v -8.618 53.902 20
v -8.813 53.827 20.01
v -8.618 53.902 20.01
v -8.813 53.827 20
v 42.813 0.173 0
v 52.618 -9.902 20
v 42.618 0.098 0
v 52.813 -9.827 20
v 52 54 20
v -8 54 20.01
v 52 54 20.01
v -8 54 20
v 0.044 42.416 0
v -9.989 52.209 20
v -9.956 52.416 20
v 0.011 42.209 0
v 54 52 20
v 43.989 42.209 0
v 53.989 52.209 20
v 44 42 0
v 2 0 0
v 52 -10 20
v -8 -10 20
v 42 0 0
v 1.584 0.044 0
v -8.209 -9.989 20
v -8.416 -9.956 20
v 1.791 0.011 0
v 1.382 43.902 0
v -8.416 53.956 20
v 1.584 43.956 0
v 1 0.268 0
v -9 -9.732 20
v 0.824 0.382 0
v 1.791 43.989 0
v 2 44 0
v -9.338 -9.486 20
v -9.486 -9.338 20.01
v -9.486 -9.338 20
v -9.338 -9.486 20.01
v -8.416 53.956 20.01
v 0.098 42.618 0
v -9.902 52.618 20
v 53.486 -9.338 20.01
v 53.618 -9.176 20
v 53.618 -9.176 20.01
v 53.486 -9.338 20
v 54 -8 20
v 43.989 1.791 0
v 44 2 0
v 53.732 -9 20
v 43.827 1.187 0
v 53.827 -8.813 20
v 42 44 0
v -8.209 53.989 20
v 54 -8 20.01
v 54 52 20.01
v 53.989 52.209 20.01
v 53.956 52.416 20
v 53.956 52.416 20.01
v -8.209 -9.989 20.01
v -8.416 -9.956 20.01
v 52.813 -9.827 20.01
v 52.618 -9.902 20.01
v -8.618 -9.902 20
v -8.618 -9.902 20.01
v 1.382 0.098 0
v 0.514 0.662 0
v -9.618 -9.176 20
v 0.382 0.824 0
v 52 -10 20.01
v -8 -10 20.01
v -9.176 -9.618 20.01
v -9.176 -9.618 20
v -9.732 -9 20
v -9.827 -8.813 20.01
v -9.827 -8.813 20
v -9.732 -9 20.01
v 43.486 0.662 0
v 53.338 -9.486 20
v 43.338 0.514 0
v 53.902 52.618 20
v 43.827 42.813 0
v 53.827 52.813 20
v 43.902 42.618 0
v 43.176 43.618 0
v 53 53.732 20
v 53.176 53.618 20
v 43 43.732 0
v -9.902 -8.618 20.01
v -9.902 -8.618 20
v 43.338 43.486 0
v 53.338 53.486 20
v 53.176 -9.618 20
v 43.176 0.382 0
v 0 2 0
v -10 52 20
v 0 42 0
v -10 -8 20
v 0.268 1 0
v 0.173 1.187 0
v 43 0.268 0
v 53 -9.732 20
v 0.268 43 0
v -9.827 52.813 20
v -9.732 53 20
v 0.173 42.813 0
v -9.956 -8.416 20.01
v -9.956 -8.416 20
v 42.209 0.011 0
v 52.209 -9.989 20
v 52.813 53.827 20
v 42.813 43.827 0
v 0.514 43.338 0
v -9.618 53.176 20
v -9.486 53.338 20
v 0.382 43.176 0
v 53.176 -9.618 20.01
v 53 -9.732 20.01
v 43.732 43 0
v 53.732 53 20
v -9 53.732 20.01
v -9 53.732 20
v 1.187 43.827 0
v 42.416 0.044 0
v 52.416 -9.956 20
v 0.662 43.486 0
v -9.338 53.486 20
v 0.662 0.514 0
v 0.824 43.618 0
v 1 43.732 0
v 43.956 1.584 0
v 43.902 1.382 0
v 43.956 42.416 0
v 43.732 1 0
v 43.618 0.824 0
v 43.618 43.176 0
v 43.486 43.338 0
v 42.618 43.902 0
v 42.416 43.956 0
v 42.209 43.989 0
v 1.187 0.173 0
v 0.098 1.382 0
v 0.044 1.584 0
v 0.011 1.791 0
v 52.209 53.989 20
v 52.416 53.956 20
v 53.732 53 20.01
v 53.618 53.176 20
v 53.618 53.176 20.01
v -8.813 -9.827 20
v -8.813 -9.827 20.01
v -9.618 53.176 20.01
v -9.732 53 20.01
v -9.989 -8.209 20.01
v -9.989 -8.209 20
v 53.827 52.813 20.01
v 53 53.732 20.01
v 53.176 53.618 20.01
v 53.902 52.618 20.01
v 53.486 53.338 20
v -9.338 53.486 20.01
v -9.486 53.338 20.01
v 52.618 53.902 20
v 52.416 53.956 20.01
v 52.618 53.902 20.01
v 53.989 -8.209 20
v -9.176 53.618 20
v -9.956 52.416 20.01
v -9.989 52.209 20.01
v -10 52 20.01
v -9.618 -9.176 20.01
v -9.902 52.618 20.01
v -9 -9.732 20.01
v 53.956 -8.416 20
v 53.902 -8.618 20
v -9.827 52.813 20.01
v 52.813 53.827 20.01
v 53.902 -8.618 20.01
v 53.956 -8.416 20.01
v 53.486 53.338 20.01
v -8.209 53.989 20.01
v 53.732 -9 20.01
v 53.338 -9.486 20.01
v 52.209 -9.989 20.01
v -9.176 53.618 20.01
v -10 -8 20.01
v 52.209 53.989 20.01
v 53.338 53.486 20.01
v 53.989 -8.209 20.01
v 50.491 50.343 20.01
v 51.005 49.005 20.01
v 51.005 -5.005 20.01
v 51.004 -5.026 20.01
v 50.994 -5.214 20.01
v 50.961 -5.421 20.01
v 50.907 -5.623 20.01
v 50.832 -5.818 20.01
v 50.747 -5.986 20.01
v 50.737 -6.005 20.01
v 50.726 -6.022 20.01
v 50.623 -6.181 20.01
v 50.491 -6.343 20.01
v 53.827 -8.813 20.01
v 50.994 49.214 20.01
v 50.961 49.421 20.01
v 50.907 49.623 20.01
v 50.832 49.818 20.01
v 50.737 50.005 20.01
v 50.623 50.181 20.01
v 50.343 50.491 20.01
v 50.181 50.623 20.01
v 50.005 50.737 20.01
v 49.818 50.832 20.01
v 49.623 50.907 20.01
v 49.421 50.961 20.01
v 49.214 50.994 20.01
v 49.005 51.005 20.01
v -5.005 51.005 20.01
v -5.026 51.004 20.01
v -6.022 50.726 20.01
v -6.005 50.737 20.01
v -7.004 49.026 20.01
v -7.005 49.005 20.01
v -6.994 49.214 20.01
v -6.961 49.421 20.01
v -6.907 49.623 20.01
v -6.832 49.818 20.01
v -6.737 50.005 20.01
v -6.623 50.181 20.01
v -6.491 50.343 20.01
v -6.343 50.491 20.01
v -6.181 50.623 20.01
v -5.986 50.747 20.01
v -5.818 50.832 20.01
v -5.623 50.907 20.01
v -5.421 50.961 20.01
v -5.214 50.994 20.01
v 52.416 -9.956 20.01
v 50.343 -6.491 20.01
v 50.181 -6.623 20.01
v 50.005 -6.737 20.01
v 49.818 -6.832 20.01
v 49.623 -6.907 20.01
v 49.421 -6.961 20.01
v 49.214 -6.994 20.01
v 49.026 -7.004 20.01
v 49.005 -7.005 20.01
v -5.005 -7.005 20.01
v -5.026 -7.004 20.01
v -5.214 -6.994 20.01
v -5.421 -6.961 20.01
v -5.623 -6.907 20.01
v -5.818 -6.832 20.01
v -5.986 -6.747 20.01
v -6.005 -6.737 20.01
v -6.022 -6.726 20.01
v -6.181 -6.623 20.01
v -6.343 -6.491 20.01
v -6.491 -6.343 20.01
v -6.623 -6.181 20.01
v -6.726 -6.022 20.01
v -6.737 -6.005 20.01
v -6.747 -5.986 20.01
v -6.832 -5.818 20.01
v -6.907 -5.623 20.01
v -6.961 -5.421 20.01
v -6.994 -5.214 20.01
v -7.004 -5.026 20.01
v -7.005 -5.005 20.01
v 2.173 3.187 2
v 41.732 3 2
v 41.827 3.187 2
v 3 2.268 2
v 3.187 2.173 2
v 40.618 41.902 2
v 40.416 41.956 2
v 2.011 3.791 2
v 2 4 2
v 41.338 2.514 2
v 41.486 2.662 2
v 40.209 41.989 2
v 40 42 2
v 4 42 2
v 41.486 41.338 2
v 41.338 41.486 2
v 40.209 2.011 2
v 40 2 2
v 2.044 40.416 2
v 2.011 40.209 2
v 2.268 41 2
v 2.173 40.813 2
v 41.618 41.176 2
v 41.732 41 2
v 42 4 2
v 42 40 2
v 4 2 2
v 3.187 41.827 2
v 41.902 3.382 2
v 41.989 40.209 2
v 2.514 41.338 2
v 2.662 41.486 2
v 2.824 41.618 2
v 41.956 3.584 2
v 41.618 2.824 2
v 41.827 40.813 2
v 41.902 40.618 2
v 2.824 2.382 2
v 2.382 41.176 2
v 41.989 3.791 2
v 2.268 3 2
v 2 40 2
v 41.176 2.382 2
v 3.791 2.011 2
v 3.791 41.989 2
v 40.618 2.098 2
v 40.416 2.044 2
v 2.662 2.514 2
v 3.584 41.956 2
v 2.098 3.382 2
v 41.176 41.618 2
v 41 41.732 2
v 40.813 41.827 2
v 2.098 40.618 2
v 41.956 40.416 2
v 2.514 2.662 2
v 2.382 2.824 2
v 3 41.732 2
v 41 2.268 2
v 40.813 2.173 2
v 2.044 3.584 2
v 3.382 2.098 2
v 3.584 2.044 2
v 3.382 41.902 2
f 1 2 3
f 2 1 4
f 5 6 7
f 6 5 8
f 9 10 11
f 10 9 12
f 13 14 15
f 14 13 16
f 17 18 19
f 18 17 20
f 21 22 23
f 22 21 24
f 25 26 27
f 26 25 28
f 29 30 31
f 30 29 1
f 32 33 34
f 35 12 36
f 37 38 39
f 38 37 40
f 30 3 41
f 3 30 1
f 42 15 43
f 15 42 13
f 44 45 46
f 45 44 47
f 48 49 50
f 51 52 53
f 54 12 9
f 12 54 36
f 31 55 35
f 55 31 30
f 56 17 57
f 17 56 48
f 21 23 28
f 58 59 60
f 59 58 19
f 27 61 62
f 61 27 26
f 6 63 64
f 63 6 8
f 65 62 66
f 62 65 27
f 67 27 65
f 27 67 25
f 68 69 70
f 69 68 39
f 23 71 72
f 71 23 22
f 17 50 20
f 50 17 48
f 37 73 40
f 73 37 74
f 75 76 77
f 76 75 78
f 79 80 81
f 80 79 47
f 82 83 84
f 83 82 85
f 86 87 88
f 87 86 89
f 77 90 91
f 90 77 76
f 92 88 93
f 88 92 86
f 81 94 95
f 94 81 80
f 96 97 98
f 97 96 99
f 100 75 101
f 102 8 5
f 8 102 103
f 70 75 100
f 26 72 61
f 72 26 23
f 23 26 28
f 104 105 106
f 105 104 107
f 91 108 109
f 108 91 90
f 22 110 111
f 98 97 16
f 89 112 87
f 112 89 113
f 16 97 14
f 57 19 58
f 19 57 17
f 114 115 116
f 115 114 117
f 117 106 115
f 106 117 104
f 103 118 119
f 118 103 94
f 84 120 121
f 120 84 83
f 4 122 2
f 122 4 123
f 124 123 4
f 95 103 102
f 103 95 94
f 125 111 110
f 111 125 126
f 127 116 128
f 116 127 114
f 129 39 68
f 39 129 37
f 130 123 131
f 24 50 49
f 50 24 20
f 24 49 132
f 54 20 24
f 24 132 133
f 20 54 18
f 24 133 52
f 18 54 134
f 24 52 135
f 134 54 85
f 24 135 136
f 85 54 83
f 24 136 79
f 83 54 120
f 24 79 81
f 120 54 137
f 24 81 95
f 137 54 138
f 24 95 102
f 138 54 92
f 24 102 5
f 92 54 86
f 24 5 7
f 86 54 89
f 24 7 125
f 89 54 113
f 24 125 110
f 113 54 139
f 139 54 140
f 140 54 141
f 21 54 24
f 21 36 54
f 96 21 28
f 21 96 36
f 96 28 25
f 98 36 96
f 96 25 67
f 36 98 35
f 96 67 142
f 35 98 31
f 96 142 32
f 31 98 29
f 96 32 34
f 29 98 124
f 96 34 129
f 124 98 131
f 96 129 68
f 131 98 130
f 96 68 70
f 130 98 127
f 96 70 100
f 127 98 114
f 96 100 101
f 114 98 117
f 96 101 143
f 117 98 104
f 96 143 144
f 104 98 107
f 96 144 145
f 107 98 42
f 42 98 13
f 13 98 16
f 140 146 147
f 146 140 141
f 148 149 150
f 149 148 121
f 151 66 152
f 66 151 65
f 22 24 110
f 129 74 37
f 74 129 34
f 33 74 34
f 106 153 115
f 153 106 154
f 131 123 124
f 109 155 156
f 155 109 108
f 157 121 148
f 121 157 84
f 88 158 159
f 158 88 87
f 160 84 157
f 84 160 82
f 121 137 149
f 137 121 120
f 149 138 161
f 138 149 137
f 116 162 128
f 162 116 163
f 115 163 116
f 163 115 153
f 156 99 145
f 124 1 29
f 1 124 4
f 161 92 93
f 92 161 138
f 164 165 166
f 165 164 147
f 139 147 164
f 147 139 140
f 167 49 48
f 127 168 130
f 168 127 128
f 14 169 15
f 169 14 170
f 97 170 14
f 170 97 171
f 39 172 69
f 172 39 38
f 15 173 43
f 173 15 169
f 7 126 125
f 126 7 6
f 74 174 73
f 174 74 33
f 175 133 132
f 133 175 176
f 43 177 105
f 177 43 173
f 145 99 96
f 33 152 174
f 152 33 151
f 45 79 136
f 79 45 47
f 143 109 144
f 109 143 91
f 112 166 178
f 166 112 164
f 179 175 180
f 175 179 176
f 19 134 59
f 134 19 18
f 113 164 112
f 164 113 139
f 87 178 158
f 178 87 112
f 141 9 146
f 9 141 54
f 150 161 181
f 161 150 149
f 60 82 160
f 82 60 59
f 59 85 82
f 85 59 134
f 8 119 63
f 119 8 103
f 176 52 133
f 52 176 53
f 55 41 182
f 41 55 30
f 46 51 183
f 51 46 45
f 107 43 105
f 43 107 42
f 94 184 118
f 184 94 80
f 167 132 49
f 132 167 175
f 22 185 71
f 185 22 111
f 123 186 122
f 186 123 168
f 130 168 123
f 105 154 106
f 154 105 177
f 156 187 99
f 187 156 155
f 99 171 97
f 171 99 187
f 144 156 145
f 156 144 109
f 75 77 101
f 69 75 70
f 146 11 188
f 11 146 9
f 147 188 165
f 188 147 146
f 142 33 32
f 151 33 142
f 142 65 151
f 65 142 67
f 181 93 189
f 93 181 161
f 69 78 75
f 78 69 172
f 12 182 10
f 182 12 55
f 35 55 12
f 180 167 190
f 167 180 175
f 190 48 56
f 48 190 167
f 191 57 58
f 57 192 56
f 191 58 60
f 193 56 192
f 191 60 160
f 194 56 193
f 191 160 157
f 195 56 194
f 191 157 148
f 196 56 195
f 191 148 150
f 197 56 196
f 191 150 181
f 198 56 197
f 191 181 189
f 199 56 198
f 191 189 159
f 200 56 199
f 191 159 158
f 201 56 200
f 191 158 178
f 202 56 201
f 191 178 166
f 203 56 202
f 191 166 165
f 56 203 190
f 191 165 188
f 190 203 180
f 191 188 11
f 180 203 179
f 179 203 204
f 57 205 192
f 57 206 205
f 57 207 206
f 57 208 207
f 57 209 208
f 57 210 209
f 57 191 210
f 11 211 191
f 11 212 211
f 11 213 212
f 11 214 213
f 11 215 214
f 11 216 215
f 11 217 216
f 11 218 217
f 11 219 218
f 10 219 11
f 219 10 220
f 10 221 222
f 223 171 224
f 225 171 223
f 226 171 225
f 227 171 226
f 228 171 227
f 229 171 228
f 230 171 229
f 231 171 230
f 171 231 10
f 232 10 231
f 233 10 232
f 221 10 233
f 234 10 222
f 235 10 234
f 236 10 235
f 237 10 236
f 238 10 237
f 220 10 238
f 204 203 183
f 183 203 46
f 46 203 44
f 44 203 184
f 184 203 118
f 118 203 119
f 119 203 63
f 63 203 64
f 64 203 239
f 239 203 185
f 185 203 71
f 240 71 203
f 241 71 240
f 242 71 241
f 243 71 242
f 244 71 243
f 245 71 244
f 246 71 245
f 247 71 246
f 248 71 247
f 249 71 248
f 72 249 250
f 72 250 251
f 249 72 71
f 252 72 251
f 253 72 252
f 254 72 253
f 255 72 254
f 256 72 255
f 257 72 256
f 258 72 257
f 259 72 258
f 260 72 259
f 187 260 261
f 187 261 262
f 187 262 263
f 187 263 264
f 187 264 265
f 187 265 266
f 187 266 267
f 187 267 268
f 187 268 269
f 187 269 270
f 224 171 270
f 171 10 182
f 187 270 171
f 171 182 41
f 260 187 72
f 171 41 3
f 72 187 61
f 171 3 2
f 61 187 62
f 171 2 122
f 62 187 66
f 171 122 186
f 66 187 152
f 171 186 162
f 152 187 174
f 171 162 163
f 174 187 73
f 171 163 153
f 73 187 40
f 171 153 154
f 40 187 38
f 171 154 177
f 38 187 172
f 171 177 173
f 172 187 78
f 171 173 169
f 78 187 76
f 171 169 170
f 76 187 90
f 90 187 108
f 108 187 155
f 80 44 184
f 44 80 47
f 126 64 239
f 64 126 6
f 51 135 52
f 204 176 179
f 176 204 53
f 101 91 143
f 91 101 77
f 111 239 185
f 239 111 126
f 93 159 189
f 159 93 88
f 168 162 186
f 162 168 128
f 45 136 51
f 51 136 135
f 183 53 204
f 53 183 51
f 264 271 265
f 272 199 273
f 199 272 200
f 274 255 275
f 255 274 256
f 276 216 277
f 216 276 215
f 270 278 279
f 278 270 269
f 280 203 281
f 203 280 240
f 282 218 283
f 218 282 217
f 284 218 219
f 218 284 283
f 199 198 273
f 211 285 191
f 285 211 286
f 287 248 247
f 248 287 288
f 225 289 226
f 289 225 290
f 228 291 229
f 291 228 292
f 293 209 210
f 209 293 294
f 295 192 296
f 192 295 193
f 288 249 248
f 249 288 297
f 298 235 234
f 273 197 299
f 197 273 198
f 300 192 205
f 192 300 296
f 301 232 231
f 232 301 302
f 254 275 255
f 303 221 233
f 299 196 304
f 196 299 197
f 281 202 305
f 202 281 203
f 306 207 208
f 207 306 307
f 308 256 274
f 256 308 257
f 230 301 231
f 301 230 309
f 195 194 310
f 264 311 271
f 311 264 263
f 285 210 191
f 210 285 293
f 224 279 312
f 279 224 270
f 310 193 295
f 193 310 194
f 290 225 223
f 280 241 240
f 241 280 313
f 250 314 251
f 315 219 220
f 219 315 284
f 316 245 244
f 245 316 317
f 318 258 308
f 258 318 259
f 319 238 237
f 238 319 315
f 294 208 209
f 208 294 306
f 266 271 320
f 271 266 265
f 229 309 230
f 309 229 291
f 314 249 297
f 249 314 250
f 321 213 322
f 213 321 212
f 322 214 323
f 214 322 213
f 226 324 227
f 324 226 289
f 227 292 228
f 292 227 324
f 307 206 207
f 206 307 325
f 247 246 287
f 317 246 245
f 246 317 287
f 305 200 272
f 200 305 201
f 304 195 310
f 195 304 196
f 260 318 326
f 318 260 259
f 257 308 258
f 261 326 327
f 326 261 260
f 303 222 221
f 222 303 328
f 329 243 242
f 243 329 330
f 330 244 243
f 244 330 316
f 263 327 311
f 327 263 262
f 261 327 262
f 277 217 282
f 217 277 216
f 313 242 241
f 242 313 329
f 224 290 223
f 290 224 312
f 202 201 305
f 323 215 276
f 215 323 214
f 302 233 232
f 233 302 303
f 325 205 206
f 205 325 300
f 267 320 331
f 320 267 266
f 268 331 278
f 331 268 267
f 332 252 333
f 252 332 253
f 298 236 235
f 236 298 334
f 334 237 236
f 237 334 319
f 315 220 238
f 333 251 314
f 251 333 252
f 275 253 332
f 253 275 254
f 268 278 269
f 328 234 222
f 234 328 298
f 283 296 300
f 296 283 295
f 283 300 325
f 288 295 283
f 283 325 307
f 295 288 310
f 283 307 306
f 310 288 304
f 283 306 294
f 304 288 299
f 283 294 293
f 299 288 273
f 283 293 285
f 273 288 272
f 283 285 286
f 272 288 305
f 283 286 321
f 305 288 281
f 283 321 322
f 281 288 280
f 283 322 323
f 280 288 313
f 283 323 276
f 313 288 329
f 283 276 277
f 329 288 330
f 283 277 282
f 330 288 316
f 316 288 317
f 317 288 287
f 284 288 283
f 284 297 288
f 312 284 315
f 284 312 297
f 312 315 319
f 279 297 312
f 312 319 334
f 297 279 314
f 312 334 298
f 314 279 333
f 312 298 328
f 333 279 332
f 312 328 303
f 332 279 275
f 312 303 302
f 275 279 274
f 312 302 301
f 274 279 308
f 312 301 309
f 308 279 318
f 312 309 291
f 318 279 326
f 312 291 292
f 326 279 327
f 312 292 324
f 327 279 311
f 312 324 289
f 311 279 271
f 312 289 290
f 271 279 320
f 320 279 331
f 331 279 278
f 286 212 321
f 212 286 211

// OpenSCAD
//dimensionType -- "inner" if the passed in dimensions are for the inside of the box i.e. the hollow parts (default), 
//  "outer" if the passed in dimensions are for the outside of the box. In this case the dimensions of the hollow part
//  will be calculated taking into account the passed in wallThickness
//hasFloor = true to make it a box with a floor, false to make the hole all the way through
module hollowCube(length = 10, width = 10, height = 10, wallThickness = 3, hasFloor = true, dimensionType = "inner", center = false, debug = false) {
    doubleWallThickness = wallThickness * 2;

    if (dimensionType == "inner") {
        echo("InnerDimensioned Hollow Cube");
        innerDimensioned();
    } else {
        echo("OuterDimensioned Hollow Cube");
        outerDimensioned();
    }

    module innerDimensioned() {
        difference() {
            //Exterior
            exteriorLength = length + doubleWallThickness;
            exteriorWidth = width + doubleWallThickness;
            if (debug) {
                echo("Wall Thickess: ", wallThickness);
                echo("Double Wall Thickess: ", doubleWallThickness);
                echo("Inner Length: ", length);
                echo("Inner Width: ", width);
                echo("Exterior Length: ", exteriorLength);
                echo("Exterior Width: ", exteriorWidth);
            }

            cube([exteriorLength, exteriorWidth, height], center = center);

            //Hollow interior
            x = center == true ? 0 : wallThickness;
            y = center == true ? 0 : wallThickness;
            if (hasFloor == true) {
                translate([x, y, wallThickness]) cube([length, width, height], center = center);
            } else {
                translate([x, y, -1]) cube([length, width, height + 10], center = center);
            }
        }
    }

    module outerDimensioned() {
        difference() {
            //Exterior
            innerLength = length - doubleWallThickness;
            innerWidth = width - doubleWallThickness;
            echo("Wall Thickess: ", wallThickness);
            echo("Double Wall Thickess: ", doubleWallThickness);
            echo("Exterior Length: ", length);
            echo("Exterior Width: ", width);
            echo("Inner Length: ", innerLength);
            echo("Inner Width: ", innerWidth);

            cube([length, width, height], center = center);

            //Hollow interior
            x = center ? 0 : wallThickness;
            y = center ? 0 : wallThickness;
            if (hasFloor) {
                translate([x, y, wallThickness]) cube([innerLength, innerWidth, height], center = center);
            } else {
                translate([x, y, -1]) cube([innerLength, innerWidth, height + 10], center = center);
            }
        }
    }
}

//dimensionType -- "inner" if the passed in dimensions are for the inside of the box i.e. the hollow parts (default), 
//  "outer" if the passed in dimensions are for the outside of the box. In this case the dimensions of the hollow part
//  will be calculated taking into account the passed in wallThickness
//hasFloor = true to make it a box with a floor, false to make the hole all the way through
//roundingShape = one of "sphere" or "circle", a sphere rounds the object along all edges, circle rounds just the corners
//  if topRoundingShape is undef this applies to all edges
//topRoundingShape = one of "sphere" or "circle", a sphere rounds the object along all edges, circle rounds just the corners
//  if defined is the rounding shape of the top edges in case you want top edges rounded differently (can be handy for lids)
module hollowRoundedCube(length = 10, width = 10, height = 10, radius = 1, wallThickness = 3, floorThickness = 3, hasFloor = true, 
    roundingShape = "sphere", topRoundingShape = undef, dimensionType = "inner", roundedInterior = false, center = false) {

    topRoundingShape = topRoundingShape == undef ? roundingShape : topRoundingShape;
    echo("TopRoundingShape: ", topRoundingShape);

    doubleWallThickness = wallThickness * 2;
    if (dimensionType == "inner") {
        innerDimensioned();
    } else {
        outerDimensioned();
    }

    module innerDimensioned() {
        difference() {
            //Exterior
            roundedCube(length + doubleWallThickness, width + doubleWallThickness, height, radius, roundingShape = roundingShape, 
                topRoundingShape = topRoundingShape, center = center);

            //Hollow interior
            x = center ? 0 : wallThickness;
            y = center ? 0 : wallThickness;
            if (hasFloor) {
                translate([x, y, floorThickness]) hollowInterior(length, width, height, center = center);
            } else {
                translate([x, y, -1]) hollowInterior(length, width, height + 10, center = center);
            }
        }
    }

    module outerDimensioned() {
        innerLength = length - doubleWallThickness;
        innerWidth = width - doubleWallThickness;
        difference() {
            //Exterior
            roundedCube(length, width, height, radius, roundingShape = roundingShape, topRoundingShape = topRoundingShape, center = center);

            //Hollow interior
            x = center ? 0 : wallThickness;
            y = center ? 0 : wallThickness;
            if (hasFloor) {
                translate([x, y, floorThickness]) hollowInterior(innerLength, innerWidth, height, center = center);
            } else {
                translate([x, y, -1]) hollowInterior(innerLength, innerWidth, height + 10, center = center);
            }
        }
    }

    module hollowInterior(length, width, height, center = center) {
        if (roundedInterior) {
            roundedCube(length, width, height, radius, roundingShape = roundingShape, topRoundingShape = topRoundingShape, center = center);
        } else {
            cube([length, width, height], center = center);
        }
    }
}

/*
    Creates rounded cube without minkowsi, this one performs a lot better than minowski cube which may be important 
    in larger designs

    roundingSphere = one of "sphere" or "circle", a sphere rounds the object along all edges, circle rounds just the corners
*/
module roundedCube(length = 10, width = 10, height = 10, radius = 1, center = false, roundingShape = "sphere", topRoundingShape = undef) {
    topRoundingShape = topRoundingShape == undef ? roundingShape : topRoundingShape;
    echo("roundedCube(), TopRoundingShape: ", topRoundingShape);
    if (center) {
        centeredRoundedCube();
    } else {
        nonCenteredRoundedCube();
    }

    module centeredRoundedCube() {
        bottomZ = roundingShape == "sphere" ? -(height - (radius * 2)) / 2 : -height / 2;
        topZ = topRoundingShape == "sphere" ? (height - (radius * 2)) / 2 : height / 2;

        echo("Centered Rounded Cube");
        echo("height: ", height);
        echo("BottomZ: ", bottomZ);
        echo("TopZ: ", topZ);

        hull() {
            translate([0, 0, bottomZ]) rectangle(length, width, radius, roundingShape);
            translate([0,0, topZ]) rectangle(length, width, radius, topRoundingShape);
        }
    }

    module nonCenteredRoundedCube() {
        z1 = topRoundingShape == "sphere" ? height - radius : height ;
        z2 = roundingShape == "sphere" ? radius : 0;
        x = length / 2;
        y = width / 2;
        echo("Non-Centered Rounded Cube");
        echo("length: ", length);
        echo("width: ", width);
        echo("height: ", height);
        echo("radius: ", radius);
        echo("x: ", x);
        echo("y: ", y);
        echo("Z1: ", z1);
        echo("Z2: ", z2);

        hull() {
            //Top
            translate([x, y, z1]) rectangle(length, width, radius, topRoundingShape);
            //Bottom
            translate([x, y, z2]) rectangle(length, width, radius, roundingShape);
        }
    }

    module rectangle(length, width, radius, roundingShape) {
        x = length - radius;
        y = width - radius;
        hull() {
            translate([(-x/2)+(radius/2), (-y/2)+(radius/2), 0]) roundingShape(radius, roundingShape);
            translate([(x/2)-(radius/2), (-y/2)+(radius/2), 0]) roundingShape(radius, roundingShape);
            translate([(-x/2)+(radius/2), (y/2)-(radius/2), 0]) roundingShape(radius, roundingShape);
            translate([(x/2)-(radius/2), (y/2)-(radius/2), 0]) roundingShape(radius, roundingShape);
        }

        module roundingShape(radius, roundingShape) {
            if (roundingShape == "sphere") {
                sphere(r = radius);
            } else {
                //make the extrusion small to make it a 3d object but don't add any size to the requested dimensions
                linear_extrude(0.000000000001) circle(r = radius);
            }
        }
    }
}

//Produces a 2D rounded square
module roundedSquare(length = 10, width = 10, radius = 1.0) {
    x = length - radius;
    y = width - radius;

    hull() {
        translate([(-x/2)+(radius/2), (-y/2)+(radius/2), 0])
        circle(r=radius);

        translate([(x/2)-(radius/2), (-y/2)+(radius/2), 0])
        circle(r=radius);

        translate([(-x/2)+(radius/2), (y/2)-(radius/2), 0])
        circle(r=radius);

        translate([(x/2)-(radius/2), (y/2)-(radius/2), 0])
        circle(r=radius);
    }
}

module taperedCube(bottomLength = 10, bottomWidth = 10, topLength = 20, topWidth = 20, height = 20, wallThickness = 3, rounded = false, roundingRadius = 1, 
    dimensionType = "inner", hollow = false, hasFloor = true, floorThickness = undef) {
    floorThickness = floorThickness == undef ? wallThickness : floorThickness;
    echo("DimensionType: ", dimensionType);
    echo("Hollow: ", hollow);
    echo("FloorThickness: ", floorThickness);
    
    doubleWallThickness = wallThickness * 2;

    if (dimensionType == "inner") {
        if (hollow) {
            echo("InnerDimensioned Hollow Tapered Cube");
            innerDimensioned();
        } else {
            assert(false, "A dimensionType of \"inner\", doesn't make sense when requesting a non-hollow tapered cube, aborting. Use dimensionType = \"outer\" instead");
        }
    } else {
        echo("OuterDimensioned Tapered Cube");
        outerDimensioned();
    }

    module innerDimensioned() {
        difference() {
            solidTaperedCube(bottomLength + doubleWallThickness, bottomWidth + doubleWallThickness, topLength + doubleWallThickness, topWidth + doubleWallThickness, height, rounded = rounded, roundingRadius = roundingRadius);

            //Can't get here if it wasn't hollow, so no need to check
            if (hasFloor) {
                echo("Hollow tapered cube has floor");
                translate([wallThickness, wallThickness, floorThickness]) solidTaperedCube(bottomLength, bottomWidth, topLength, topWidth, height, rounded = rounded, roundingRadius = roundingRadius);
            } else {
                echo("Hollow tapered cube no floor");
                translate([wallThickness, wallThickness, -0.01]) solidTaperedCube(bottomLength, bottomWidth, topLength, topWidth, height + 0.02, rounded = rounded, roundingRadius = roundingRadius);
            }
        }
    }

    module outerDimensioned() {
        halfWallThickness = wallThickness / 2;
        adjustedBottomLength = bottomLength - wallThickness;
        adjustedBottomWidth = bottomWidth - wallThickness;
        adjustedTopLength = topLength - wallThickness;
        adjustedTopWidth = topWidth - wallThickness;
        difference() {
            solidTaperedCube(bottomLength, bottomWidth, topLength, topWidth, height, rounded = rounded, roundingRadius = roundingRadius);

            if (hollow) {
                if (hasFloor) {
                    echo("Hollow tapered cube has floor");
                    translate([halfWallThickness, halfWallThickness, floorThickness]) solidTaperedCube(adjustedBottomLength, adjustedBottomWidth, adjustedTopLength, adjustedTopWidth, height, rounded = rounded, roundingRadius = roundingRadius);
                } else {
                    echo("Hollow tapered cube no floor");
                    translate([halfWallThickness, halfWallThickness, -0.01]) solidTaperedCube(adjustedBottomLength, adjustedBottomWidth, adjustedTopLength, adjustedTopWidth, height + 0.02, rounded = rounded, roundingRadius = roundingRadius);
                }
            }
        }
    }

    //A rounded taperedCube can only be rounded with circles, not spheres because sphere radius adds dimension making everything all wonky
    module solidTaperedCube(bottomLength = 10, bottomWidth = 10, topLength = 20, topWidth = 20, height = 20, rounded = false, roundingRadius = 1, center = false) {
        cubeHeight = 0.01;
        if (center) {
            z = height / 2;
            hull() {
                if (rounded) {
                    translate([0, 0, -z]) roundedCube(length = bottomLength, width = bottomWidth, height = cubeHeight, radius = roundingRadius, center = center, roundingShape = "circle");
                    translate([0, 0, z]) roundedCube(length = topLength, width = topWidth, height = cubeHeight, radius = roundingRadius, center = center, roundingShape = "circle");
                } else {
                    translate([0, 0, -z]) cube([bottomLength, bottomWidth, cubeHeight], center = center);
                    translate([0, 0, z]) cube([topLength, topWidth, cubeHeight], center = center);
                }
            }
        } else {
            hull() {
                topX = bottomLength / 2 - topLength / 2;
                topY = bottomWidth / 2 - topWidth / 2;
                topZ = height;
                if (rounded) {
                    roundedCube(length = bottomLength, width = bottomWidth, height = cubeHeight, radius = roundingRadius, center = false, roundingShape = "circle");
                    translate([topX, topY, topZ]) roundedCube(length = topLength, width = topWidth, height = cubeHeight, radius = roundingRadius, center = false, roundingShape = "circle");
                } else {
                    cube([bottomLength, bottomWidth, cubeHeight], center = center);
                    translate([topX, topY, topZ]) cube([topLength, topWidth, cubeHeight], center = center);
                }
            }
        }
    }
}

/**
    This module creates a cube with minkowski applied to it with a sphere resulting in a rounded cube. This
    module accepts desired measurments and makes adjustments based on the requested minkowski 
    radius to make sure the cube is that size  (minkowski results in sizes increasing)

    The quality of the sphere used for rounding will be controlled by the $fn variable which 
    should be set prior to calling this module.

    NOTE: Minkowski is a giant pain in the ass to deal with because it adds dimensions equal to
      2 * minkowskiRadius. Use one of the other rounded cubes instead

    * desiredLength -- length refers to X axis dimension, defaults to 10
    * desiredWidth -- width refers to Y axis dimension, defaults to 10
    * desiredHeight -- height refers to Z axis dimension, defaults to 10
    * minkowskiRadius -- how rounded the sides are, bigger radius is more rounded, defaults to 2
    * center -- same as center parameter on normal cube, defaults to true
*/
module minkowskiCube(desiredLength = 10, desiredWidth = 10, desiredHeight = 10, minkowskiRadius = 2, center = false) {
    adjustedLength = desiredLength - (minkowskiRadius * 2);
    adjustedWidth = desiredWidth - (minkowskiRadius * 2);
    adjustedHeight = desiredHeight - (minkowskiRadius * 2);
    echo("Mink Cube AdjustedLength: ", adjustedLength);
    echo("Mink Cube AdjustedWidth: ", adjustedWidth);
    echo("Mink Cube AdjustedHeight: ", adjustedHeight);
    echo("Mink Cube Center: ", center);

    minkowski() {
        translate([0, 0, minkowskiRadius]) cube([adjustedLength, adjustedWidth, adjustedHeight], center = center);
        sphere(minkowskiRadius);
    }
}

////////////////Test/////////////////
$fn = 60;
//roundedCube(length = 40, width = 30, height = 20, center = false, roundingShape = "sphere", radius = 2.5);
//hollowRoundedCube(length = 40, width = 30, height = 20, roundingShape = "sphere", topRoundingShape = "sphere", 
//    dimensionType = "inner", radius = 1.5, wallThickness = 3, floorThickness = 3, hasFloor = true, roundedInterior = true, center = false);
taperedCube(bottomLength = 40, bottomWidth = 40, topLength = 60, topWidth = 60, height = 20, wallThickness = 2, rounded = true, roundingRadius = 2, 
    dimensionType = "inner", hollow = true, hasFloor = true, floorThickness = 2);
